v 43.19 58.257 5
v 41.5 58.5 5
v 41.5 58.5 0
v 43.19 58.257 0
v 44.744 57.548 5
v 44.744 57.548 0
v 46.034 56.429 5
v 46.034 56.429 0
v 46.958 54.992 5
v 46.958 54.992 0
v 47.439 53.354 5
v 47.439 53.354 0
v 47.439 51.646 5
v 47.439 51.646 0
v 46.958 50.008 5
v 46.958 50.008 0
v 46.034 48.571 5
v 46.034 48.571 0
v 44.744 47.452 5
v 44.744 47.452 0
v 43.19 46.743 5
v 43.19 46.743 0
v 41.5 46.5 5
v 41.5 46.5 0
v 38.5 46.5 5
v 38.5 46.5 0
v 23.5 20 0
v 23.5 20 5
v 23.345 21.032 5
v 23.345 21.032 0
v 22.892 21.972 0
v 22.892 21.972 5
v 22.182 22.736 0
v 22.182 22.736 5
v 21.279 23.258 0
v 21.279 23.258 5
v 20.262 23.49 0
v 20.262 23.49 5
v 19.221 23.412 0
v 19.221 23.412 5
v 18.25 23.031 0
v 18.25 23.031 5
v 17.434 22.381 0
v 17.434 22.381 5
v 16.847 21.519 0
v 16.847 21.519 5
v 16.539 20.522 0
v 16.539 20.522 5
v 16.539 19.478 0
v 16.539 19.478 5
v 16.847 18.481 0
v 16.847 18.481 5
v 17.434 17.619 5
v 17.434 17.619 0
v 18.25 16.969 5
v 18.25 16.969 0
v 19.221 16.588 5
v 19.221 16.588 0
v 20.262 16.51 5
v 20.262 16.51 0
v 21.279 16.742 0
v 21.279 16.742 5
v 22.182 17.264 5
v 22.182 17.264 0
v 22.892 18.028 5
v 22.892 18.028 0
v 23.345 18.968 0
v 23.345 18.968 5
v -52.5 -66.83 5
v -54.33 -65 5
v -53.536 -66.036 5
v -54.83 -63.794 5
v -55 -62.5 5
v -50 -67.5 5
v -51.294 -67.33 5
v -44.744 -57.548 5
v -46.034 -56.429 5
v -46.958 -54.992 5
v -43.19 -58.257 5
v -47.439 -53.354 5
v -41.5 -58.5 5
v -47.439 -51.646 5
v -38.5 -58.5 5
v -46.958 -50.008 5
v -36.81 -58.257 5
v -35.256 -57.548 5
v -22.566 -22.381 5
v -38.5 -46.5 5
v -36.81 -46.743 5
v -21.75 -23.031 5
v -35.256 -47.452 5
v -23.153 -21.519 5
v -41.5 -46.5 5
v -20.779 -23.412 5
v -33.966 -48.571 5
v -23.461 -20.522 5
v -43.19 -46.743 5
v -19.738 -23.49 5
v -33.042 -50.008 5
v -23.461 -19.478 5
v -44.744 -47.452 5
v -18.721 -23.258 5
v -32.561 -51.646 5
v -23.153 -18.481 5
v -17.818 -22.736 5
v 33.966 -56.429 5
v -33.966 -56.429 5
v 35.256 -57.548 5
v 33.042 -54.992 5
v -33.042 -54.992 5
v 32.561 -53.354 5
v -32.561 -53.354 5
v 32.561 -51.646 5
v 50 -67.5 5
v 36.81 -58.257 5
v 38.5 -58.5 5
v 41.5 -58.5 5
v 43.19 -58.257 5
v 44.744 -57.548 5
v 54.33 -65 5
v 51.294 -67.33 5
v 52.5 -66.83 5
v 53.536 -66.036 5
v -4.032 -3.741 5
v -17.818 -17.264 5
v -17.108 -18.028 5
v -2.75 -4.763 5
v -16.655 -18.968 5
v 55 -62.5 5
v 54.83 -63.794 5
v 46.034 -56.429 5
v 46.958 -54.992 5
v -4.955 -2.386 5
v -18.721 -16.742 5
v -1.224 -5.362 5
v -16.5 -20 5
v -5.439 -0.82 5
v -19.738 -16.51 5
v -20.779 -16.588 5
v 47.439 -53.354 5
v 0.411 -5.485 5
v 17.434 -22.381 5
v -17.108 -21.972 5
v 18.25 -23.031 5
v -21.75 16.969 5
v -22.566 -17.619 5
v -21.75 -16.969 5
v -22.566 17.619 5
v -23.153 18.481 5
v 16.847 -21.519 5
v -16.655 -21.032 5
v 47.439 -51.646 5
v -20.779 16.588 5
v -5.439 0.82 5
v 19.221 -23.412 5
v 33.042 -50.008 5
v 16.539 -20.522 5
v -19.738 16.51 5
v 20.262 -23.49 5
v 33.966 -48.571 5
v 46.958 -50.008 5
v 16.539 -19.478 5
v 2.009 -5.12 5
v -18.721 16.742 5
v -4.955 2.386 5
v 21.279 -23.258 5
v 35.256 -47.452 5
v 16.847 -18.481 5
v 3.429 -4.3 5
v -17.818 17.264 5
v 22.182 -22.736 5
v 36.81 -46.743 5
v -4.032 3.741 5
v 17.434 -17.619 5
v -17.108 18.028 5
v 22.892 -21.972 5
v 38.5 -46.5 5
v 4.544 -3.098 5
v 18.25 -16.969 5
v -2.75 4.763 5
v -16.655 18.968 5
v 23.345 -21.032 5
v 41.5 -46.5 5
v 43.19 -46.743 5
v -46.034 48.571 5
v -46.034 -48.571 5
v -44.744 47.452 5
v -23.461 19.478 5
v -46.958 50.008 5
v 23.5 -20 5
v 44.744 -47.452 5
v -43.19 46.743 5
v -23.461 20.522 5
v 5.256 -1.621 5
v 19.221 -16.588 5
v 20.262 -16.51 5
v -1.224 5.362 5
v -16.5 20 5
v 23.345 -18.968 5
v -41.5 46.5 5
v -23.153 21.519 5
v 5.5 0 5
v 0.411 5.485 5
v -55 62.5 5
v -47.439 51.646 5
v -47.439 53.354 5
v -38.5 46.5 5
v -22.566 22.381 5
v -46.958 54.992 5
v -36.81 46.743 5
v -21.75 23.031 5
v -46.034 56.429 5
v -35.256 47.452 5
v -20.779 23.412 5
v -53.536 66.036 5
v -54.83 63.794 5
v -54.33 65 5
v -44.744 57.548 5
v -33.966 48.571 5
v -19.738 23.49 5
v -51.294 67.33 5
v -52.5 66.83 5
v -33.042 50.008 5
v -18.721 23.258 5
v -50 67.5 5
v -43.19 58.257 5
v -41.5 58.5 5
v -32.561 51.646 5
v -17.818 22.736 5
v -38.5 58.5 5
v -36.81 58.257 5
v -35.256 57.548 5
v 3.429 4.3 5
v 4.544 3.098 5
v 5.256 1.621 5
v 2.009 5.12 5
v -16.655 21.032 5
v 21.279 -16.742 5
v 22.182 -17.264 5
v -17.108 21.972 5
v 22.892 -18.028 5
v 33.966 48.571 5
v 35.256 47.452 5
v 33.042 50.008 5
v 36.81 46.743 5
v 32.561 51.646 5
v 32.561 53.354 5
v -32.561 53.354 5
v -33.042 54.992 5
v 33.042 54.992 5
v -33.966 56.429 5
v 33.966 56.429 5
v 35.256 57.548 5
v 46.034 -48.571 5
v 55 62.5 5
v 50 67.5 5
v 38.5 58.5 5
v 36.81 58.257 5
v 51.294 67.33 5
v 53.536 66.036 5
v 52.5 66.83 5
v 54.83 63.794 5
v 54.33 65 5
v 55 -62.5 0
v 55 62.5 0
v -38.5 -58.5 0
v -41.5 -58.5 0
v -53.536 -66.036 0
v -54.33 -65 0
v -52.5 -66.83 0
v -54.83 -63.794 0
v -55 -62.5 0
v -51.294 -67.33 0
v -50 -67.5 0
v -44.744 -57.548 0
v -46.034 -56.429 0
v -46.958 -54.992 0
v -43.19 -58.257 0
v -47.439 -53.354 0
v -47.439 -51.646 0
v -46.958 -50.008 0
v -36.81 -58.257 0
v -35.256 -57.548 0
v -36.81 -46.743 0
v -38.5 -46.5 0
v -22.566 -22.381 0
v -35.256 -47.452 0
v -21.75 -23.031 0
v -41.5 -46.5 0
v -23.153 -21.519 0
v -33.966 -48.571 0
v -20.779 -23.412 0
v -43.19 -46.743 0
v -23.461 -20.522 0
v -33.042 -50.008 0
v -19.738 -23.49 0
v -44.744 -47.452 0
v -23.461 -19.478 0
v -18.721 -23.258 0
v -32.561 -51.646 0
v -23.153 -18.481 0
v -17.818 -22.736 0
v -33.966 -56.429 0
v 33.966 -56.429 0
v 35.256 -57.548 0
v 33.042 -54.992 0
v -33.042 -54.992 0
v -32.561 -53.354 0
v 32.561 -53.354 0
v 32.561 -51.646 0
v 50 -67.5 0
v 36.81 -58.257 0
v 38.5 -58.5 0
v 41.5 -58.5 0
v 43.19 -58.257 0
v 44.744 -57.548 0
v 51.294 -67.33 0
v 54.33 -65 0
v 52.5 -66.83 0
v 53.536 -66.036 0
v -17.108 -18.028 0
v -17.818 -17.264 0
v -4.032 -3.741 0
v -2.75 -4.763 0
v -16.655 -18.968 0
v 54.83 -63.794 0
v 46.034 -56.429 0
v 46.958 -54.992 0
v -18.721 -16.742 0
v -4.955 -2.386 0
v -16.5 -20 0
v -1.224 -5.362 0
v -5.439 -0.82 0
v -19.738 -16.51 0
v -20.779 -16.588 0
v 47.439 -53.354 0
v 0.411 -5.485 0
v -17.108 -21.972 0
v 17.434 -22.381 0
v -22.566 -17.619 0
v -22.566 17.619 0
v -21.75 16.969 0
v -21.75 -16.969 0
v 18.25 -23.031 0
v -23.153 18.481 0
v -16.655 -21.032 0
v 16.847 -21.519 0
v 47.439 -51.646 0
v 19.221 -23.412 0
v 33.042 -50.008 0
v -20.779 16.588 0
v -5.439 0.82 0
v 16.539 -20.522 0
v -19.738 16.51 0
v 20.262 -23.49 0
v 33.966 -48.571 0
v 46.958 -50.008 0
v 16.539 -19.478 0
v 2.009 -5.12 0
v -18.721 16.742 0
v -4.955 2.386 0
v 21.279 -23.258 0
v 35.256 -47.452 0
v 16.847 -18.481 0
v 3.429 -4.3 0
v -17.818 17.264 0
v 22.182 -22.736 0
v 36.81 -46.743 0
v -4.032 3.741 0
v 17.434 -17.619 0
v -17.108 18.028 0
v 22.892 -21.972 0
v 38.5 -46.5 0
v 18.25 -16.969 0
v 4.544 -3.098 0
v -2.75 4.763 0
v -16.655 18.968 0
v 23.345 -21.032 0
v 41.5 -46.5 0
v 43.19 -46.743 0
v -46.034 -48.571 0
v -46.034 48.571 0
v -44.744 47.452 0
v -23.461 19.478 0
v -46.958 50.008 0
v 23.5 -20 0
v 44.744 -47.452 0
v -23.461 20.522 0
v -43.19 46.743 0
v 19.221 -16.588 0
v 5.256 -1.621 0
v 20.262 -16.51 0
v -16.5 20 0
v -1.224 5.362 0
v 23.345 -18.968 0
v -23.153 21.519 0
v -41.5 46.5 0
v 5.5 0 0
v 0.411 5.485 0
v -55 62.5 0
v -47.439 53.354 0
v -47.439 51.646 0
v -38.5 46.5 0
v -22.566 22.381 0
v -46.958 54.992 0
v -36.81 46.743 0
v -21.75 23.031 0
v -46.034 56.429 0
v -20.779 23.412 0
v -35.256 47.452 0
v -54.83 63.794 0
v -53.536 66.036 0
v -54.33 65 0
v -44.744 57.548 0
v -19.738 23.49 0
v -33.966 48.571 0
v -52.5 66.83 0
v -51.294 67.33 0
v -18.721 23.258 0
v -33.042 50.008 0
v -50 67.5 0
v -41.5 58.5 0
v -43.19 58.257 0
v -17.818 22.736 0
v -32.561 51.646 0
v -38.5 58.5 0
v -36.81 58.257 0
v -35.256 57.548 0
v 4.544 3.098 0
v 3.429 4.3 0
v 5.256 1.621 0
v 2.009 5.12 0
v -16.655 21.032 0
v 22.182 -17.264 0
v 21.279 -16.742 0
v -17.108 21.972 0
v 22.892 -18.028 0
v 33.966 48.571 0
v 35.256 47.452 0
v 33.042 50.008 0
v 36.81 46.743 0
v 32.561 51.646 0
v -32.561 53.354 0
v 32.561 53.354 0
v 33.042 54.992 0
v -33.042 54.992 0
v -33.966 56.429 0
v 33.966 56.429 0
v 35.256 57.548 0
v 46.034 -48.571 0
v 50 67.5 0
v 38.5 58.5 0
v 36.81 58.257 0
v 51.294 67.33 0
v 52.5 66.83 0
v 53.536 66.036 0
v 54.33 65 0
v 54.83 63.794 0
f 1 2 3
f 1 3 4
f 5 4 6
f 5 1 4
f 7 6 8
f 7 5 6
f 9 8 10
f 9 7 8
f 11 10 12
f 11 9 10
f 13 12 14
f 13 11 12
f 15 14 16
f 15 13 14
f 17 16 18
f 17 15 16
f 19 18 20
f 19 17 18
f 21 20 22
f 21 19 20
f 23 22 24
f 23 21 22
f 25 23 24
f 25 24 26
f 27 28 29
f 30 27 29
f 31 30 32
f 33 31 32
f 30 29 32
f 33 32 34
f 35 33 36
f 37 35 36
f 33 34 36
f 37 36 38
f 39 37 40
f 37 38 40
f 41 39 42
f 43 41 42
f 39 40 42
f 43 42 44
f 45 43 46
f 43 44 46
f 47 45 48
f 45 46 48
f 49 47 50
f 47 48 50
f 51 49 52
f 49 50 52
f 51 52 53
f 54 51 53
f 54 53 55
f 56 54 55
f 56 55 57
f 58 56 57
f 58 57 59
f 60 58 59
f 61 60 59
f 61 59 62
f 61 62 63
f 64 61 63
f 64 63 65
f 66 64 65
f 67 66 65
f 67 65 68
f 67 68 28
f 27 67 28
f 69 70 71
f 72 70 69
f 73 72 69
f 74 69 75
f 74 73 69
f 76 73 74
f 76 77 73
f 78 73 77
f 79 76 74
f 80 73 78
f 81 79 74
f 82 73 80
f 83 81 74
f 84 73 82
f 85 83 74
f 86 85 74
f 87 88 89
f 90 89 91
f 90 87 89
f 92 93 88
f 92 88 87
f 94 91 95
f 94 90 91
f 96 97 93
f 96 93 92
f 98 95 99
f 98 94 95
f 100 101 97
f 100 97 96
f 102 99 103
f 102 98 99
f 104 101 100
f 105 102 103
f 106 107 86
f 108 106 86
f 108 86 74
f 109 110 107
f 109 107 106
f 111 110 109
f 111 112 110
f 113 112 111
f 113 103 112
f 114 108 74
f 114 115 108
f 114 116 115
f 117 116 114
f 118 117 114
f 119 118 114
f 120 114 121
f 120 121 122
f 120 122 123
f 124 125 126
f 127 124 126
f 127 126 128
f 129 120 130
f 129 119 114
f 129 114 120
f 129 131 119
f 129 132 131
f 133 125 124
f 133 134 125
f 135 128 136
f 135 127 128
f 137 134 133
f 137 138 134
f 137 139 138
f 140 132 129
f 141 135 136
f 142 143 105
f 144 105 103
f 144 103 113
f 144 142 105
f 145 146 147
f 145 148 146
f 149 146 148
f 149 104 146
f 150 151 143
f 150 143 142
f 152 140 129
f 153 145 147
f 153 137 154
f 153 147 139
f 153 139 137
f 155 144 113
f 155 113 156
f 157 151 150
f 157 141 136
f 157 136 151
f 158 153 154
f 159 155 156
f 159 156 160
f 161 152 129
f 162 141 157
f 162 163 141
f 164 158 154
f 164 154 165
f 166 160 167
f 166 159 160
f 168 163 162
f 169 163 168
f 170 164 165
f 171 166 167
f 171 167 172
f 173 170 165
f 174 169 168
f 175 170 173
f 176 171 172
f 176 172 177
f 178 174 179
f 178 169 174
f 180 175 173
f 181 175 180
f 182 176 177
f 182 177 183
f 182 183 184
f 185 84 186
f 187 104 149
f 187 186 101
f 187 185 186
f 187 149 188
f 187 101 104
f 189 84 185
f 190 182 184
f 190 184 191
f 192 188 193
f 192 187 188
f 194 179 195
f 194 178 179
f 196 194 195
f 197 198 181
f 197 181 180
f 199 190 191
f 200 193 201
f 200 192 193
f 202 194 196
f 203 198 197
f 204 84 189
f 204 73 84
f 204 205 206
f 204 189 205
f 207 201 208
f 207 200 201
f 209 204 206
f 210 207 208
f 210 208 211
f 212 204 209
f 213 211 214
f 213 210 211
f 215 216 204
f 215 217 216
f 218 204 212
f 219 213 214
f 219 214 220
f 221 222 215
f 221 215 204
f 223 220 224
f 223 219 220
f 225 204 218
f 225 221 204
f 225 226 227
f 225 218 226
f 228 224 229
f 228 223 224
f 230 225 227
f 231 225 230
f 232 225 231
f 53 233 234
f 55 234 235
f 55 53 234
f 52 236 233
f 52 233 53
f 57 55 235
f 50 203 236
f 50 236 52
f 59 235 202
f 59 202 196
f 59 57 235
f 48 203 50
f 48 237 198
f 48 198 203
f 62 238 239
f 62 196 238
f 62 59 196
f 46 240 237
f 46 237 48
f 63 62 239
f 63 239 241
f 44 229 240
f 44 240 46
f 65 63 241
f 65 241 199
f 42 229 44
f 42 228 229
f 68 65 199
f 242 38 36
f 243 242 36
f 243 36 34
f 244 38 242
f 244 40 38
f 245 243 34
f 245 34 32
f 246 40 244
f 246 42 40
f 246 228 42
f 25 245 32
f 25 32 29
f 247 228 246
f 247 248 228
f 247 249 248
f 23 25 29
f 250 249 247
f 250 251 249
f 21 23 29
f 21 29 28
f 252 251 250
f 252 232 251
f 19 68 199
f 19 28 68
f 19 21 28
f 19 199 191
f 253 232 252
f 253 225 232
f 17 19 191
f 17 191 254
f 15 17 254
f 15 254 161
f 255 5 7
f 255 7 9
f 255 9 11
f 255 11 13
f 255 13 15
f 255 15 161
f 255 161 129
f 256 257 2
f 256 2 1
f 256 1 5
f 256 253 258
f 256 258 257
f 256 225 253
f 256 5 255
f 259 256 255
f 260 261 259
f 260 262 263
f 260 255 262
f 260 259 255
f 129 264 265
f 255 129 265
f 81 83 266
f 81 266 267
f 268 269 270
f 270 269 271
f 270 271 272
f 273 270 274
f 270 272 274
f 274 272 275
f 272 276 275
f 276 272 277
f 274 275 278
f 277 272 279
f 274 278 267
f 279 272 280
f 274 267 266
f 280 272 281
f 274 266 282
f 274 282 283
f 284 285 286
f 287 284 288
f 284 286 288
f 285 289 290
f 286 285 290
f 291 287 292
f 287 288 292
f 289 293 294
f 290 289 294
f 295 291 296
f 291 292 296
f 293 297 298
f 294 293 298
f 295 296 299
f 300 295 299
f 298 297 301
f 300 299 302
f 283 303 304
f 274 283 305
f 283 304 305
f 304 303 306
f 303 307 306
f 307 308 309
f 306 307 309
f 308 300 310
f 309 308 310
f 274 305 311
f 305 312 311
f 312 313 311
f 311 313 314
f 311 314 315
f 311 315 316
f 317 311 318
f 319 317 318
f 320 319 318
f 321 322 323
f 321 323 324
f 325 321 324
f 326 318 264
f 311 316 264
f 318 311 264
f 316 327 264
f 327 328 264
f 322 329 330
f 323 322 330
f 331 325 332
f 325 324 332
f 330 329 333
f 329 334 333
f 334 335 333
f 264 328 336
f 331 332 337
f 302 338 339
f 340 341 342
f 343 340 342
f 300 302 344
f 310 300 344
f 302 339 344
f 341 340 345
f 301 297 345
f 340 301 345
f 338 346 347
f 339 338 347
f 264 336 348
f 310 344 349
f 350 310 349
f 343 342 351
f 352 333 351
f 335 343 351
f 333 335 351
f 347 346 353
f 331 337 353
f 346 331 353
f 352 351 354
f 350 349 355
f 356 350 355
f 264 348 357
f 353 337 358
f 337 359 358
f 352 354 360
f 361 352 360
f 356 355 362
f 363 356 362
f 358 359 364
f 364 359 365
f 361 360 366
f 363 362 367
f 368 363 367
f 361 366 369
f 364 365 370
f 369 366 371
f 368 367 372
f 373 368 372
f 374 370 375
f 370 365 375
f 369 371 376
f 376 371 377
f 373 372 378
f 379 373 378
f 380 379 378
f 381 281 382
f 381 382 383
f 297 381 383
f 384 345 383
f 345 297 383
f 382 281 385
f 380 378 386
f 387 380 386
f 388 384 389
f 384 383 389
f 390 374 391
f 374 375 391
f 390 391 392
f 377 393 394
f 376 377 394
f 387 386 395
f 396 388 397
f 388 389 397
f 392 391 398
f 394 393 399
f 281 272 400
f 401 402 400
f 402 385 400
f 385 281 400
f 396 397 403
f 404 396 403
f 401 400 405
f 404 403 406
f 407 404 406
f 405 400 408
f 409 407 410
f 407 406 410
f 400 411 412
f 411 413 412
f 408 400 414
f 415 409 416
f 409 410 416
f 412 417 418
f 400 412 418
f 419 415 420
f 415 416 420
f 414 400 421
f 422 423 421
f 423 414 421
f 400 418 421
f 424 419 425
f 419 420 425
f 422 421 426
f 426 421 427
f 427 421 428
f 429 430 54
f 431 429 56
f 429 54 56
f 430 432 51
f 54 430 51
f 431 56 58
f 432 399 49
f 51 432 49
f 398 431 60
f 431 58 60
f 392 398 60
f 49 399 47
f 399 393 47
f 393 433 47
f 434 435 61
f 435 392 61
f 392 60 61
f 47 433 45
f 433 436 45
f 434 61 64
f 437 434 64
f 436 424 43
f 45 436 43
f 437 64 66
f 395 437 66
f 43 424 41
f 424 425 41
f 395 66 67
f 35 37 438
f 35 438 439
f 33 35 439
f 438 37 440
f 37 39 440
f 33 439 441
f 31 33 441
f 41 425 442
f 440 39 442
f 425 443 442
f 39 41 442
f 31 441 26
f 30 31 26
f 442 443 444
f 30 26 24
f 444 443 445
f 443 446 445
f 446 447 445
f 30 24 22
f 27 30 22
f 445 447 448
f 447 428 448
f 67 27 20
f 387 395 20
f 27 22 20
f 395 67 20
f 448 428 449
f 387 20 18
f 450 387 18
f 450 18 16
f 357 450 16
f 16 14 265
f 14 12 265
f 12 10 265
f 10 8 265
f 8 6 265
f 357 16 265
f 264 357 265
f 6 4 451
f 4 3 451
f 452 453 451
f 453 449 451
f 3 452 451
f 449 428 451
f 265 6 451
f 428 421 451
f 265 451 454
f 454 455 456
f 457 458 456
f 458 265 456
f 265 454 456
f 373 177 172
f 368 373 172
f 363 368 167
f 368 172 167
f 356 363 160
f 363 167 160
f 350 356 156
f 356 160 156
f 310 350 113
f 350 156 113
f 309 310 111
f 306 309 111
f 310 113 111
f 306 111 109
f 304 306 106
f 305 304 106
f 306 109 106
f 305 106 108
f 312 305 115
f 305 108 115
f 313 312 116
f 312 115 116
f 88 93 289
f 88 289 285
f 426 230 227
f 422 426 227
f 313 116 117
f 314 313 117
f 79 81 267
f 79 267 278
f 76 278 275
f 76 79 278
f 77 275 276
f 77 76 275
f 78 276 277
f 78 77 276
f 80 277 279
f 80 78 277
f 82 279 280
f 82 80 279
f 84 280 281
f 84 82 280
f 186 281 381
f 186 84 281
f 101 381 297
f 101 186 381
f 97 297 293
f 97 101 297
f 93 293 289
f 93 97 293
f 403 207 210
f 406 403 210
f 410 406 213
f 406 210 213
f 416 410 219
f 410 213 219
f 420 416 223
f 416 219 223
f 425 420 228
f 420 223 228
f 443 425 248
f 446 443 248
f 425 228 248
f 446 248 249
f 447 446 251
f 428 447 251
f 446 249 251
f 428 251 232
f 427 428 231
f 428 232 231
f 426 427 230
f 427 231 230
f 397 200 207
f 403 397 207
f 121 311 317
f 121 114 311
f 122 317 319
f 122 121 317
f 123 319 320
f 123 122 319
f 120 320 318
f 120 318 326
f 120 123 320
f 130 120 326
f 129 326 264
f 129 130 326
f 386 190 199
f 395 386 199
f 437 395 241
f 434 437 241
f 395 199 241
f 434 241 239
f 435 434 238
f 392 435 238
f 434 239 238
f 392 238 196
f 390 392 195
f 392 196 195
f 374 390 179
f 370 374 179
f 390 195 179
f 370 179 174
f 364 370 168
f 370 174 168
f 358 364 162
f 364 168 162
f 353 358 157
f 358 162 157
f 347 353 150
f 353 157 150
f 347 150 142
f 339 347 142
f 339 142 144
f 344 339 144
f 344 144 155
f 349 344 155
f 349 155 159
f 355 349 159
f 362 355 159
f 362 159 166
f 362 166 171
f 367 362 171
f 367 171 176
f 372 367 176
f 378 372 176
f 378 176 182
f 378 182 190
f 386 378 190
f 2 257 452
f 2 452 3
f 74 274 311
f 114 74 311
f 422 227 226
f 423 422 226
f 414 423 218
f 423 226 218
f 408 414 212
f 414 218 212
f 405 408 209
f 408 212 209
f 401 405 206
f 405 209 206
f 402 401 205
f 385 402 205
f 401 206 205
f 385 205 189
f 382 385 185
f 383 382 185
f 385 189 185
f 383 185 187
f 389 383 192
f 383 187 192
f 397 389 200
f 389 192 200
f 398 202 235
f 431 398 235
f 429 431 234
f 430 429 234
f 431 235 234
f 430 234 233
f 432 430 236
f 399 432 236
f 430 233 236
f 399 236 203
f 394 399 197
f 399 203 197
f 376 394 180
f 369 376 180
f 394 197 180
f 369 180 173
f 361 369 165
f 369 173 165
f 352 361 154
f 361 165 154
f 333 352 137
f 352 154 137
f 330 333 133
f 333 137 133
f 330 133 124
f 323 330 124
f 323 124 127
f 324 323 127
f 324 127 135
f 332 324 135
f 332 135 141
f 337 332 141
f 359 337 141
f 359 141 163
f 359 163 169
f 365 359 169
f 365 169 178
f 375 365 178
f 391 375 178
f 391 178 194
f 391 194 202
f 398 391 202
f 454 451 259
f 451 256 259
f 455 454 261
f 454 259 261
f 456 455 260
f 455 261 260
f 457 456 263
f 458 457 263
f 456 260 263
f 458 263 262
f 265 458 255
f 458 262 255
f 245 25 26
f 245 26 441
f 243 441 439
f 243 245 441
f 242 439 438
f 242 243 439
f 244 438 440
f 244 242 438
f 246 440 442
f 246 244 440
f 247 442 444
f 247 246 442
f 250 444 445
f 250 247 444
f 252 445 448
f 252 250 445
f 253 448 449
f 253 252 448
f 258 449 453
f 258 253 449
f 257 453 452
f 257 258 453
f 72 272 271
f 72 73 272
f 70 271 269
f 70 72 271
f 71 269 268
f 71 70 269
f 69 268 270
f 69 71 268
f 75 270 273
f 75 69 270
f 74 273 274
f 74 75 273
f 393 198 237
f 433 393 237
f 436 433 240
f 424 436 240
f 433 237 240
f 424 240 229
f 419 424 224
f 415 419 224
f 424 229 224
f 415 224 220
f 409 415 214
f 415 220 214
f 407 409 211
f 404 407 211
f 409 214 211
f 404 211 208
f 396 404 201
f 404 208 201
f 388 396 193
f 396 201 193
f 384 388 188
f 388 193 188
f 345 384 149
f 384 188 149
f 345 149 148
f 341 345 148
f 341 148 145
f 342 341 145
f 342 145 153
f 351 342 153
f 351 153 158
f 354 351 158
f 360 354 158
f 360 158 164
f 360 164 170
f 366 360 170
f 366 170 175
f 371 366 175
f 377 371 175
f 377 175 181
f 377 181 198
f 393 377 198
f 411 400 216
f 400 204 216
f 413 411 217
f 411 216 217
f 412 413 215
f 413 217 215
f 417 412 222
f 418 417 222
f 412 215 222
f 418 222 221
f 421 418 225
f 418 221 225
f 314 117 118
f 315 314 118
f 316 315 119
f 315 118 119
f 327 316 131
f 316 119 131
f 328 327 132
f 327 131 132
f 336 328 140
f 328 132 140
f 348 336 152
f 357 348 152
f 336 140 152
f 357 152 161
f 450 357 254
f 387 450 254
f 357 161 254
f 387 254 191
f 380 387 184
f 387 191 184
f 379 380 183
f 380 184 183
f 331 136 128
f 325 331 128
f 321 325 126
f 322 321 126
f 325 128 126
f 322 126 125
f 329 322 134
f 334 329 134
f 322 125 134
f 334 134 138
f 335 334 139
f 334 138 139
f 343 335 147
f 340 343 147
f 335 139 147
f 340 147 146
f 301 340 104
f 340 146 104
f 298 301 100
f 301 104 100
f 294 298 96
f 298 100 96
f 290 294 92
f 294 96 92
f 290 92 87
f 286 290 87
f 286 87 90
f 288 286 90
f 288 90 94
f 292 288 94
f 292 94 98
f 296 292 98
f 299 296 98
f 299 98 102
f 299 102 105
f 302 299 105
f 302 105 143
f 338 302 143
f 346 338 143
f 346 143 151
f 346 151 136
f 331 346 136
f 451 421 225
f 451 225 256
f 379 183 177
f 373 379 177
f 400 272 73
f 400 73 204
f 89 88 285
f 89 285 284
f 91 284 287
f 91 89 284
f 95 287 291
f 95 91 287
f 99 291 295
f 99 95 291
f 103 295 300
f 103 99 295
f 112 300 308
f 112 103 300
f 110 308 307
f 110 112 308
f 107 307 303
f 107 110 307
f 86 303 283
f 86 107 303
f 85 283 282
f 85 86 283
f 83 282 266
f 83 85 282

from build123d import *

# Parameters (mm, degrees)
F0_W             = 110
F0_H             = 135
F1_DEPTH         = 5
F2_R             = 3.5
F2_R_2           = 5.5
F3_DEPTH         = 25
F5_DEPTH         = 25
F5_COPIES2_COUNT = 2
F5_COPIES2_PITCH = 132.003788
F6_R             = 5


# Not quite as in the source:
# - a pattern or mirror of a feature is missing from the dataset's text; its kind, count and spacing are read off the source's solid


with BuildPart() as f1:
    # F0 (on Top) → F1 (new body)
    with BuildSketch(Plane.XY):
        Rectangle(F0_W, F0_H)
    extrude(amount=F1_DEPTH)

    # F2 (on face) → F3 (cut)
    with BuildSketch(Plane.XY.offset(5)):
        with Locations((-20, 20)):
            Circle(F2_R)
        with Locations((20, 20)):
            Circle(F2_R)
        with Locations((20, -20)):
            Circle(F2_R)
        with Locations((-20, -20)):
            Circle(F2_R)
        Circle(F2_R_2)
    extrude(amount=-F3_DEPTH, mode=Mode.SUBTRACT)

    # F4 (on face) → F5 (cut)
    with BuildSketch(Plane.XY.offset(5)):
        with BuildLine():
            ThreePointArc((-41.5, 58.5), (-47.5, 52.5), (-41.5, 46.5))
            Line((-41.5, 46.5), (-38.5, 46.5))
            ThreePointArc((-38.5, 46.5), (-32.5, 52.5), (-38.5, 58.5))
            Line((-38.5, 58.5), (-41.5, 58.5))
        make_face()
    f5 = extrude(amount=-F5_DEPTH, mode=Mode.SUBTRACT)

    # F5_copies: F5 across plane
    add(f5.mirror(Plane(origin=(0, 0, 0), x_dir=(0, 0, -1), z_dir=(0, -1, 0))), mode=Mode.SUBTRACT)

    # F5_copies1: F5 across plane
    add(f5.mirror(Plane(origin=(0, 0, 0), x_dir=(0, 0, 1), z_dir=(1, 0, 0))), mode=Mode.SUBTRACT)

    # F5_copies2: F5 ×2
    with Locations(*[Vector(0.6060432153, -0.79543172, 0) * (i * F5_COPIES2_PITCH) for i in range(1, F5_COPIES2_COUNT)]):
        add(f5, mode=Mode.SUBTRACT)

    # F6
    f6_edges = [f1.edges().sort_by_distance(p)[0] for p in [
        (-55, 67.5, 2.5),
        (55, 67.5, 2.5),
        (55, -67.5, 2.5),
        (-55, -67.5, 2.5),
    ]]
    fillet(f6_edges, radius=F6_R)


solid = f1.part
